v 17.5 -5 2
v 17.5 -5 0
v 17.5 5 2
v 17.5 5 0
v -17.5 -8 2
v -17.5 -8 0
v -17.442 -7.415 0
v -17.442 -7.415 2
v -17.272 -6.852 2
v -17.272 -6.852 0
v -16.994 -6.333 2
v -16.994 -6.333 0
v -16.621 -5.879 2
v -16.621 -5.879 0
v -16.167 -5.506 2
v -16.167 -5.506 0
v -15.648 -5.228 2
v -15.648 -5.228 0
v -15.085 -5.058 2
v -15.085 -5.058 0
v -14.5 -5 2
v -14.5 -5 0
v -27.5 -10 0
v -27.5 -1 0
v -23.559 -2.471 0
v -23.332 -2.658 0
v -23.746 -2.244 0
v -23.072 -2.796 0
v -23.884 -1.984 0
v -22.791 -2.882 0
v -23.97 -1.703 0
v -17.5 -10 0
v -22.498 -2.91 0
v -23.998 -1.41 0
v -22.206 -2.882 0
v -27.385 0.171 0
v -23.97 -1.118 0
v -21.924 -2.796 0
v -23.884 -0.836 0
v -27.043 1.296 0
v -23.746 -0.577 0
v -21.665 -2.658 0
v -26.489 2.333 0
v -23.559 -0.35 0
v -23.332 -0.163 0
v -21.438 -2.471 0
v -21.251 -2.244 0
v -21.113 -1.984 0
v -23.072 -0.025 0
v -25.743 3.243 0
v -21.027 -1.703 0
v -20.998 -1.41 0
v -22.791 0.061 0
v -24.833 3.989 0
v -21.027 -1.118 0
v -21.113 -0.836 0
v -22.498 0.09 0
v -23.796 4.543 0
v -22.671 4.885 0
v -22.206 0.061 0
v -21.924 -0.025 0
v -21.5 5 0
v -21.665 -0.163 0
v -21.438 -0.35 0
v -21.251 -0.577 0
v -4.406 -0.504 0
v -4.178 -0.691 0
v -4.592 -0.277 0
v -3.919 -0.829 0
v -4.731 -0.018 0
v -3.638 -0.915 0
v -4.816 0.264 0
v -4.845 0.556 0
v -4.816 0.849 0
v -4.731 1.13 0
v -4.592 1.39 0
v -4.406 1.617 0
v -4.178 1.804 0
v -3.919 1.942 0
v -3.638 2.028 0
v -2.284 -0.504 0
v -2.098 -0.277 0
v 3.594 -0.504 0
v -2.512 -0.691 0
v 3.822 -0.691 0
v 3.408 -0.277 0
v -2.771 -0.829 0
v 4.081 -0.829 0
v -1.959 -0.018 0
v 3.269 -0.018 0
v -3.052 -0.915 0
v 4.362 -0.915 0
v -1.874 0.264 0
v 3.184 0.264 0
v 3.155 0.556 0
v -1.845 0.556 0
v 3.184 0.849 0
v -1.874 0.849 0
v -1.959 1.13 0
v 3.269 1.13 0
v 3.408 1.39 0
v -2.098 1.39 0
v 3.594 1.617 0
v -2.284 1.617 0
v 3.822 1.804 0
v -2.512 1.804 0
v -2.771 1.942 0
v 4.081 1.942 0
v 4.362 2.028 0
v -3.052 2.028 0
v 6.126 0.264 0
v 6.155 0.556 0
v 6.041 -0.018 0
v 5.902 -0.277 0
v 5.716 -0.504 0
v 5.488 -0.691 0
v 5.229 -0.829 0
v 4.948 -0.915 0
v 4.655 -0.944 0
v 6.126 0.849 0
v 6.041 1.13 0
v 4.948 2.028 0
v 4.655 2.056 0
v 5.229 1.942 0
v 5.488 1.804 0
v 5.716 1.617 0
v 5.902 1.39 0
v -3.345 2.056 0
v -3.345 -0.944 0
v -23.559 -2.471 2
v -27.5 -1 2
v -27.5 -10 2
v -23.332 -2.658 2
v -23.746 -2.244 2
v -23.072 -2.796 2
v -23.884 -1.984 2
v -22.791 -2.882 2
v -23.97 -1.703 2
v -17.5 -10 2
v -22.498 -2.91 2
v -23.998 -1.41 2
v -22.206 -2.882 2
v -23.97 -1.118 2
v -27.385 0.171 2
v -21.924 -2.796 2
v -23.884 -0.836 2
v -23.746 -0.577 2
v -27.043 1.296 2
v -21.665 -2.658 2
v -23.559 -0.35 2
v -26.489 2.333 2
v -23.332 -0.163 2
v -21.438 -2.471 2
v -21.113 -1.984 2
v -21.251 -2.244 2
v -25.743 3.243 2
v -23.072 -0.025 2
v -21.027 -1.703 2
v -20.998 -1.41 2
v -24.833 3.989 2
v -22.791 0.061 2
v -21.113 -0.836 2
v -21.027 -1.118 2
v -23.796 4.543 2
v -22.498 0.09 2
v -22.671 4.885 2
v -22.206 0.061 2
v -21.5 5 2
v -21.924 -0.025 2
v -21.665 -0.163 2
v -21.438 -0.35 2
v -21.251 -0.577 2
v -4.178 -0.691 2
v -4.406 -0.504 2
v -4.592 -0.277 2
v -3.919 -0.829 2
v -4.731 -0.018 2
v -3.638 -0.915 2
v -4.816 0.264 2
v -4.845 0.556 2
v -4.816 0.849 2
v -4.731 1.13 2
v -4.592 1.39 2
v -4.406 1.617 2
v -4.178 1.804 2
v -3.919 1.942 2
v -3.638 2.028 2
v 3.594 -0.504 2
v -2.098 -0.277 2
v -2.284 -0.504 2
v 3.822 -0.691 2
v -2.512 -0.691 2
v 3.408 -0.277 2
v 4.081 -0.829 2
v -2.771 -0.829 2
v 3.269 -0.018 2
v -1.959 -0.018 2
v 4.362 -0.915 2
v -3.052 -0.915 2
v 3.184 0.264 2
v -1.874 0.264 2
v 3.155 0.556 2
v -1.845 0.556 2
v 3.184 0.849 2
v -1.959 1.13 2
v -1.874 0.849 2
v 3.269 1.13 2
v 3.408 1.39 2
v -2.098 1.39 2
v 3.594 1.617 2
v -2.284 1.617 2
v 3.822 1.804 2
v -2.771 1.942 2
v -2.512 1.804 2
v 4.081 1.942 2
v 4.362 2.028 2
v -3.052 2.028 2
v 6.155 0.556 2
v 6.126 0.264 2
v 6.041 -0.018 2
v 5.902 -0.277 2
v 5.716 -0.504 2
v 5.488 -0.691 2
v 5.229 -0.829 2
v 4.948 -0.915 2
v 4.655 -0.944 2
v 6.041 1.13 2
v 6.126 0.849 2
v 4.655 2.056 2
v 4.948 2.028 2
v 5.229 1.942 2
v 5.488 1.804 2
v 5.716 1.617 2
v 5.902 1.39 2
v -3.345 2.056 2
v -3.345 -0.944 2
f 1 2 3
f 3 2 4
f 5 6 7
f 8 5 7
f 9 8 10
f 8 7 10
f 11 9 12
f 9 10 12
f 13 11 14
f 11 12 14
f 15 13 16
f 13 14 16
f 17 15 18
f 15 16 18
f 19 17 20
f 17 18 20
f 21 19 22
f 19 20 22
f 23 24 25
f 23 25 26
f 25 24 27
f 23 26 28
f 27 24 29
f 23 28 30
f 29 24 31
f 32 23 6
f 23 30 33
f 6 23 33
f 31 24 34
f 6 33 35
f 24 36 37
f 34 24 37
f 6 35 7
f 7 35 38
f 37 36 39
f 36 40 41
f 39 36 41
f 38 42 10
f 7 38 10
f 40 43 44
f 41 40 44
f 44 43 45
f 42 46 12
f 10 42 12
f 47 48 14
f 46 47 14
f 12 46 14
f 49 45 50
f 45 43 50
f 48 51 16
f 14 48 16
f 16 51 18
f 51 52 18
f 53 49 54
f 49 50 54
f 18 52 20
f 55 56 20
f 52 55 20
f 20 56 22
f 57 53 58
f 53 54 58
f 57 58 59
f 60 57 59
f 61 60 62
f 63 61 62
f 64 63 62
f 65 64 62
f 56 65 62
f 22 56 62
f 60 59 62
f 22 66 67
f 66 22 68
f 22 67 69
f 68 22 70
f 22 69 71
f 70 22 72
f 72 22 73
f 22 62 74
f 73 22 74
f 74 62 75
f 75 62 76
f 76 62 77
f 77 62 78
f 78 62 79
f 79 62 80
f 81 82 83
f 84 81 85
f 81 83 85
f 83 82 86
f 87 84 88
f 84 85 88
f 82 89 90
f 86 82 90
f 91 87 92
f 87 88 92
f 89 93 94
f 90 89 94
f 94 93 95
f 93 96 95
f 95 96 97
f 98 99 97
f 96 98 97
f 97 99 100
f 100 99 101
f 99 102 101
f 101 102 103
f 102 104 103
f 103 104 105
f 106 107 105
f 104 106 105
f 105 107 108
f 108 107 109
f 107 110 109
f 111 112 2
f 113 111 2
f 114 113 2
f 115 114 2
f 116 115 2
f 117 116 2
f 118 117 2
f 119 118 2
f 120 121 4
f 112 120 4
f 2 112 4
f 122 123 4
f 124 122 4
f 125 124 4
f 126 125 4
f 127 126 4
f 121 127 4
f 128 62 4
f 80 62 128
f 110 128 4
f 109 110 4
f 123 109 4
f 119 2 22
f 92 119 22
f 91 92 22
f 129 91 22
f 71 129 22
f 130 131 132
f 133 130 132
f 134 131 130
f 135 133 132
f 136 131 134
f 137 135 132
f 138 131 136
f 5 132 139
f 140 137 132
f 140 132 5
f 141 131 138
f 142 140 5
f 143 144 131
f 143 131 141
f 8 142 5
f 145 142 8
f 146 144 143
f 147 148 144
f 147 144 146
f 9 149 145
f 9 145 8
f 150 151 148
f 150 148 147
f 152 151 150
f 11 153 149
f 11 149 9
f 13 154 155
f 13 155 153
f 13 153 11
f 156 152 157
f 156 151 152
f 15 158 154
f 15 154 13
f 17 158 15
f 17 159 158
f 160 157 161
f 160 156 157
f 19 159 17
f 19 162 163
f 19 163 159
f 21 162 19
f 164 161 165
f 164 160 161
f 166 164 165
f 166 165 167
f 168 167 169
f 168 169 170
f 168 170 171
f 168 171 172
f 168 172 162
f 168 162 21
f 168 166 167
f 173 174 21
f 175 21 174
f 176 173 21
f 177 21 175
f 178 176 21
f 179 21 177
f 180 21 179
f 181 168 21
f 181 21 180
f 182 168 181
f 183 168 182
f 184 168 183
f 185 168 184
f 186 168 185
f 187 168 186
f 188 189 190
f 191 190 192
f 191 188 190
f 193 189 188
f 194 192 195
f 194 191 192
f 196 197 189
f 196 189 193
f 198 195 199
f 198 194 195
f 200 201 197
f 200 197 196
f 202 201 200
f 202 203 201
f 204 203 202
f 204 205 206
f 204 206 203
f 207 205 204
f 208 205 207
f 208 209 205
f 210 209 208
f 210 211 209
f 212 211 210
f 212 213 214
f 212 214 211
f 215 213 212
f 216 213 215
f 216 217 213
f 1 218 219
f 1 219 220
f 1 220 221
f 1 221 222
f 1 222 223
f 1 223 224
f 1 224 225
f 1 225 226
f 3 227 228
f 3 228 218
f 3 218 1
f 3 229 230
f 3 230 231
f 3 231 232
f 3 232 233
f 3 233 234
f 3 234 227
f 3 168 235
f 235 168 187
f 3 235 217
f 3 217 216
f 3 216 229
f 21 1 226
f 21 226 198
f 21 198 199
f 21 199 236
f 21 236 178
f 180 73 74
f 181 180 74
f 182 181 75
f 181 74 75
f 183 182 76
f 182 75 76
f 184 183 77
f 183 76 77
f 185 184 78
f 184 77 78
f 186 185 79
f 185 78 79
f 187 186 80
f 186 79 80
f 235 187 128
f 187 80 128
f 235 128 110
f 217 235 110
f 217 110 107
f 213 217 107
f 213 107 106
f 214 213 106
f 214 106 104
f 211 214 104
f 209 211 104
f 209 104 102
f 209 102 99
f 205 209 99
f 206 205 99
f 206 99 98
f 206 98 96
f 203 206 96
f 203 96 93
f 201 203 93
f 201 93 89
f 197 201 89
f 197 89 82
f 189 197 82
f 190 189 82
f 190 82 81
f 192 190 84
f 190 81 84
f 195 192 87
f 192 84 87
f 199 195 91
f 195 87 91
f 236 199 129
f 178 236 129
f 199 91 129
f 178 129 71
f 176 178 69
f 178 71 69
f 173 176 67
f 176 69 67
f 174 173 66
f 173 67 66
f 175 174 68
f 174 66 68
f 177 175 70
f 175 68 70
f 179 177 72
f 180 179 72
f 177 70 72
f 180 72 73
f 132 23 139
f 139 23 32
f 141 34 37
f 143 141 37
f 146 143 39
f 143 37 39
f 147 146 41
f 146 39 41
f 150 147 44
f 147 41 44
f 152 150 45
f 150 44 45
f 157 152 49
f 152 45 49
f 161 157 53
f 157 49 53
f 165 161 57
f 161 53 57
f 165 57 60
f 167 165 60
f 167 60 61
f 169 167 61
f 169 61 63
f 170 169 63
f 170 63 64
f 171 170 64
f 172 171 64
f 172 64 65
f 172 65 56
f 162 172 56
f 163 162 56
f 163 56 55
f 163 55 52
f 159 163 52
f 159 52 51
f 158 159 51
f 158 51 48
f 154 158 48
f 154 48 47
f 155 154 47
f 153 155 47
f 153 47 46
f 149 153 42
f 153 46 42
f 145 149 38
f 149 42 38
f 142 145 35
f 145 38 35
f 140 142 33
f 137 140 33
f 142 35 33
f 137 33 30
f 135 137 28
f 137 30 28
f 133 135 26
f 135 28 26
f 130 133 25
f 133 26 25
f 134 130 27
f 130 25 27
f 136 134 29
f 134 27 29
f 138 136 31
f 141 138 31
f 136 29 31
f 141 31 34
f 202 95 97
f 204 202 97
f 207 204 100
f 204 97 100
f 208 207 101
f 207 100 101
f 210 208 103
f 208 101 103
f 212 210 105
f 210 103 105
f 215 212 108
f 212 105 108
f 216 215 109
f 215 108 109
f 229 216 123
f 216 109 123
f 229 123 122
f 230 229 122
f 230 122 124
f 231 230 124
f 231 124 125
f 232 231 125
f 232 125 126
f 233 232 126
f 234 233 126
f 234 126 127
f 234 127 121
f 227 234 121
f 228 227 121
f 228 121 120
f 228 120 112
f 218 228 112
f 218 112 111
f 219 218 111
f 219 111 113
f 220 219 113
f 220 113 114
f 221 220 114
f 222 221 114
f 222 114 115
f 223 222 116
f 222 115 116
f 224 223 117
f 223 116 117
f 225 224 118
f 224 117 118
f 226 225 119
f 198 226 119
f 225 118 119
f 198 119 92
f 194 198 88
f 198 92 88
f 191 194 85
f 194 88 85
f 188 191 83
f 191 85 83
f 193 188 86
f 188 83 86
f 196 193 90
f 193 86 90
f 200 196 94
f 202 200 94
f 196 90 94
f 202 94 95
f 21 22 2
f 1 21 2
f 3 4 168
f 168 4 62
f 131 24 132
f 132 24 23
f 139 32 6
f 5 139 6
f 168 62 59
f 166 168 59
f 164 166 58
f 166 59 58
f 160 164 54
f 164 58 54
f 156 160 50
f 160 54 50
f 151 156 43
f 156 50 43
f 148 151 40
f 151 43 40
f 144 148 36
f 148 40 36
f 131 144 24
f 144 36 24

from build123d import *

# Parameters (mm, degrees)
EXTRUDE_1_DEPTH = 2
HOLE_WIZARD_1_D = 3
HOLE_WIZARD_2_D = 3


with BuildPart() as part:
    # 草图1 → 凸台-拉伸1 (new body)
    with BuildSketch(Plane.XY):
        with BuildLine():
            Line((17.5, 5), (-17.5, 5))
            Line((-17.5, 5), (-21.5, 5))
            ThreePointArc((-21.5, 5), (-25.742640687, 3.242640687), (-27.5, -1))
            Line((-27.5, -1), (-27.5, -10))
            Line((-27.5, -10), (-17.5, -10))
            Line((-17.5, -10), (-17.5, -8))
            ThreePointArc((-17.5, -8), (-16.621320344, -5.878679656), (-14.5, -5))
            Line((-14.5, -5), (17.5, -5))
            Line((17.5, -5), (17.5, 5))
        make_face()
    extrude(amount=EXTRUDE_1_DEPTH)

    # 孔1 (through all)
    with Locations(Plane.XY.offset(2)):
        with Locations((-22.498361417, -1.410422078)):
            Hole(HOLE_WIZARD_1_D / 2)

    # 孔2 (through all)
    with Locations(Plane.XY.offset(2)):
        with Locations((4.655, 0.556399926), (-3.345, 0.556399926)):
            Hole(HOLE_WIZARD_2_D / 2)


solid = part.part
